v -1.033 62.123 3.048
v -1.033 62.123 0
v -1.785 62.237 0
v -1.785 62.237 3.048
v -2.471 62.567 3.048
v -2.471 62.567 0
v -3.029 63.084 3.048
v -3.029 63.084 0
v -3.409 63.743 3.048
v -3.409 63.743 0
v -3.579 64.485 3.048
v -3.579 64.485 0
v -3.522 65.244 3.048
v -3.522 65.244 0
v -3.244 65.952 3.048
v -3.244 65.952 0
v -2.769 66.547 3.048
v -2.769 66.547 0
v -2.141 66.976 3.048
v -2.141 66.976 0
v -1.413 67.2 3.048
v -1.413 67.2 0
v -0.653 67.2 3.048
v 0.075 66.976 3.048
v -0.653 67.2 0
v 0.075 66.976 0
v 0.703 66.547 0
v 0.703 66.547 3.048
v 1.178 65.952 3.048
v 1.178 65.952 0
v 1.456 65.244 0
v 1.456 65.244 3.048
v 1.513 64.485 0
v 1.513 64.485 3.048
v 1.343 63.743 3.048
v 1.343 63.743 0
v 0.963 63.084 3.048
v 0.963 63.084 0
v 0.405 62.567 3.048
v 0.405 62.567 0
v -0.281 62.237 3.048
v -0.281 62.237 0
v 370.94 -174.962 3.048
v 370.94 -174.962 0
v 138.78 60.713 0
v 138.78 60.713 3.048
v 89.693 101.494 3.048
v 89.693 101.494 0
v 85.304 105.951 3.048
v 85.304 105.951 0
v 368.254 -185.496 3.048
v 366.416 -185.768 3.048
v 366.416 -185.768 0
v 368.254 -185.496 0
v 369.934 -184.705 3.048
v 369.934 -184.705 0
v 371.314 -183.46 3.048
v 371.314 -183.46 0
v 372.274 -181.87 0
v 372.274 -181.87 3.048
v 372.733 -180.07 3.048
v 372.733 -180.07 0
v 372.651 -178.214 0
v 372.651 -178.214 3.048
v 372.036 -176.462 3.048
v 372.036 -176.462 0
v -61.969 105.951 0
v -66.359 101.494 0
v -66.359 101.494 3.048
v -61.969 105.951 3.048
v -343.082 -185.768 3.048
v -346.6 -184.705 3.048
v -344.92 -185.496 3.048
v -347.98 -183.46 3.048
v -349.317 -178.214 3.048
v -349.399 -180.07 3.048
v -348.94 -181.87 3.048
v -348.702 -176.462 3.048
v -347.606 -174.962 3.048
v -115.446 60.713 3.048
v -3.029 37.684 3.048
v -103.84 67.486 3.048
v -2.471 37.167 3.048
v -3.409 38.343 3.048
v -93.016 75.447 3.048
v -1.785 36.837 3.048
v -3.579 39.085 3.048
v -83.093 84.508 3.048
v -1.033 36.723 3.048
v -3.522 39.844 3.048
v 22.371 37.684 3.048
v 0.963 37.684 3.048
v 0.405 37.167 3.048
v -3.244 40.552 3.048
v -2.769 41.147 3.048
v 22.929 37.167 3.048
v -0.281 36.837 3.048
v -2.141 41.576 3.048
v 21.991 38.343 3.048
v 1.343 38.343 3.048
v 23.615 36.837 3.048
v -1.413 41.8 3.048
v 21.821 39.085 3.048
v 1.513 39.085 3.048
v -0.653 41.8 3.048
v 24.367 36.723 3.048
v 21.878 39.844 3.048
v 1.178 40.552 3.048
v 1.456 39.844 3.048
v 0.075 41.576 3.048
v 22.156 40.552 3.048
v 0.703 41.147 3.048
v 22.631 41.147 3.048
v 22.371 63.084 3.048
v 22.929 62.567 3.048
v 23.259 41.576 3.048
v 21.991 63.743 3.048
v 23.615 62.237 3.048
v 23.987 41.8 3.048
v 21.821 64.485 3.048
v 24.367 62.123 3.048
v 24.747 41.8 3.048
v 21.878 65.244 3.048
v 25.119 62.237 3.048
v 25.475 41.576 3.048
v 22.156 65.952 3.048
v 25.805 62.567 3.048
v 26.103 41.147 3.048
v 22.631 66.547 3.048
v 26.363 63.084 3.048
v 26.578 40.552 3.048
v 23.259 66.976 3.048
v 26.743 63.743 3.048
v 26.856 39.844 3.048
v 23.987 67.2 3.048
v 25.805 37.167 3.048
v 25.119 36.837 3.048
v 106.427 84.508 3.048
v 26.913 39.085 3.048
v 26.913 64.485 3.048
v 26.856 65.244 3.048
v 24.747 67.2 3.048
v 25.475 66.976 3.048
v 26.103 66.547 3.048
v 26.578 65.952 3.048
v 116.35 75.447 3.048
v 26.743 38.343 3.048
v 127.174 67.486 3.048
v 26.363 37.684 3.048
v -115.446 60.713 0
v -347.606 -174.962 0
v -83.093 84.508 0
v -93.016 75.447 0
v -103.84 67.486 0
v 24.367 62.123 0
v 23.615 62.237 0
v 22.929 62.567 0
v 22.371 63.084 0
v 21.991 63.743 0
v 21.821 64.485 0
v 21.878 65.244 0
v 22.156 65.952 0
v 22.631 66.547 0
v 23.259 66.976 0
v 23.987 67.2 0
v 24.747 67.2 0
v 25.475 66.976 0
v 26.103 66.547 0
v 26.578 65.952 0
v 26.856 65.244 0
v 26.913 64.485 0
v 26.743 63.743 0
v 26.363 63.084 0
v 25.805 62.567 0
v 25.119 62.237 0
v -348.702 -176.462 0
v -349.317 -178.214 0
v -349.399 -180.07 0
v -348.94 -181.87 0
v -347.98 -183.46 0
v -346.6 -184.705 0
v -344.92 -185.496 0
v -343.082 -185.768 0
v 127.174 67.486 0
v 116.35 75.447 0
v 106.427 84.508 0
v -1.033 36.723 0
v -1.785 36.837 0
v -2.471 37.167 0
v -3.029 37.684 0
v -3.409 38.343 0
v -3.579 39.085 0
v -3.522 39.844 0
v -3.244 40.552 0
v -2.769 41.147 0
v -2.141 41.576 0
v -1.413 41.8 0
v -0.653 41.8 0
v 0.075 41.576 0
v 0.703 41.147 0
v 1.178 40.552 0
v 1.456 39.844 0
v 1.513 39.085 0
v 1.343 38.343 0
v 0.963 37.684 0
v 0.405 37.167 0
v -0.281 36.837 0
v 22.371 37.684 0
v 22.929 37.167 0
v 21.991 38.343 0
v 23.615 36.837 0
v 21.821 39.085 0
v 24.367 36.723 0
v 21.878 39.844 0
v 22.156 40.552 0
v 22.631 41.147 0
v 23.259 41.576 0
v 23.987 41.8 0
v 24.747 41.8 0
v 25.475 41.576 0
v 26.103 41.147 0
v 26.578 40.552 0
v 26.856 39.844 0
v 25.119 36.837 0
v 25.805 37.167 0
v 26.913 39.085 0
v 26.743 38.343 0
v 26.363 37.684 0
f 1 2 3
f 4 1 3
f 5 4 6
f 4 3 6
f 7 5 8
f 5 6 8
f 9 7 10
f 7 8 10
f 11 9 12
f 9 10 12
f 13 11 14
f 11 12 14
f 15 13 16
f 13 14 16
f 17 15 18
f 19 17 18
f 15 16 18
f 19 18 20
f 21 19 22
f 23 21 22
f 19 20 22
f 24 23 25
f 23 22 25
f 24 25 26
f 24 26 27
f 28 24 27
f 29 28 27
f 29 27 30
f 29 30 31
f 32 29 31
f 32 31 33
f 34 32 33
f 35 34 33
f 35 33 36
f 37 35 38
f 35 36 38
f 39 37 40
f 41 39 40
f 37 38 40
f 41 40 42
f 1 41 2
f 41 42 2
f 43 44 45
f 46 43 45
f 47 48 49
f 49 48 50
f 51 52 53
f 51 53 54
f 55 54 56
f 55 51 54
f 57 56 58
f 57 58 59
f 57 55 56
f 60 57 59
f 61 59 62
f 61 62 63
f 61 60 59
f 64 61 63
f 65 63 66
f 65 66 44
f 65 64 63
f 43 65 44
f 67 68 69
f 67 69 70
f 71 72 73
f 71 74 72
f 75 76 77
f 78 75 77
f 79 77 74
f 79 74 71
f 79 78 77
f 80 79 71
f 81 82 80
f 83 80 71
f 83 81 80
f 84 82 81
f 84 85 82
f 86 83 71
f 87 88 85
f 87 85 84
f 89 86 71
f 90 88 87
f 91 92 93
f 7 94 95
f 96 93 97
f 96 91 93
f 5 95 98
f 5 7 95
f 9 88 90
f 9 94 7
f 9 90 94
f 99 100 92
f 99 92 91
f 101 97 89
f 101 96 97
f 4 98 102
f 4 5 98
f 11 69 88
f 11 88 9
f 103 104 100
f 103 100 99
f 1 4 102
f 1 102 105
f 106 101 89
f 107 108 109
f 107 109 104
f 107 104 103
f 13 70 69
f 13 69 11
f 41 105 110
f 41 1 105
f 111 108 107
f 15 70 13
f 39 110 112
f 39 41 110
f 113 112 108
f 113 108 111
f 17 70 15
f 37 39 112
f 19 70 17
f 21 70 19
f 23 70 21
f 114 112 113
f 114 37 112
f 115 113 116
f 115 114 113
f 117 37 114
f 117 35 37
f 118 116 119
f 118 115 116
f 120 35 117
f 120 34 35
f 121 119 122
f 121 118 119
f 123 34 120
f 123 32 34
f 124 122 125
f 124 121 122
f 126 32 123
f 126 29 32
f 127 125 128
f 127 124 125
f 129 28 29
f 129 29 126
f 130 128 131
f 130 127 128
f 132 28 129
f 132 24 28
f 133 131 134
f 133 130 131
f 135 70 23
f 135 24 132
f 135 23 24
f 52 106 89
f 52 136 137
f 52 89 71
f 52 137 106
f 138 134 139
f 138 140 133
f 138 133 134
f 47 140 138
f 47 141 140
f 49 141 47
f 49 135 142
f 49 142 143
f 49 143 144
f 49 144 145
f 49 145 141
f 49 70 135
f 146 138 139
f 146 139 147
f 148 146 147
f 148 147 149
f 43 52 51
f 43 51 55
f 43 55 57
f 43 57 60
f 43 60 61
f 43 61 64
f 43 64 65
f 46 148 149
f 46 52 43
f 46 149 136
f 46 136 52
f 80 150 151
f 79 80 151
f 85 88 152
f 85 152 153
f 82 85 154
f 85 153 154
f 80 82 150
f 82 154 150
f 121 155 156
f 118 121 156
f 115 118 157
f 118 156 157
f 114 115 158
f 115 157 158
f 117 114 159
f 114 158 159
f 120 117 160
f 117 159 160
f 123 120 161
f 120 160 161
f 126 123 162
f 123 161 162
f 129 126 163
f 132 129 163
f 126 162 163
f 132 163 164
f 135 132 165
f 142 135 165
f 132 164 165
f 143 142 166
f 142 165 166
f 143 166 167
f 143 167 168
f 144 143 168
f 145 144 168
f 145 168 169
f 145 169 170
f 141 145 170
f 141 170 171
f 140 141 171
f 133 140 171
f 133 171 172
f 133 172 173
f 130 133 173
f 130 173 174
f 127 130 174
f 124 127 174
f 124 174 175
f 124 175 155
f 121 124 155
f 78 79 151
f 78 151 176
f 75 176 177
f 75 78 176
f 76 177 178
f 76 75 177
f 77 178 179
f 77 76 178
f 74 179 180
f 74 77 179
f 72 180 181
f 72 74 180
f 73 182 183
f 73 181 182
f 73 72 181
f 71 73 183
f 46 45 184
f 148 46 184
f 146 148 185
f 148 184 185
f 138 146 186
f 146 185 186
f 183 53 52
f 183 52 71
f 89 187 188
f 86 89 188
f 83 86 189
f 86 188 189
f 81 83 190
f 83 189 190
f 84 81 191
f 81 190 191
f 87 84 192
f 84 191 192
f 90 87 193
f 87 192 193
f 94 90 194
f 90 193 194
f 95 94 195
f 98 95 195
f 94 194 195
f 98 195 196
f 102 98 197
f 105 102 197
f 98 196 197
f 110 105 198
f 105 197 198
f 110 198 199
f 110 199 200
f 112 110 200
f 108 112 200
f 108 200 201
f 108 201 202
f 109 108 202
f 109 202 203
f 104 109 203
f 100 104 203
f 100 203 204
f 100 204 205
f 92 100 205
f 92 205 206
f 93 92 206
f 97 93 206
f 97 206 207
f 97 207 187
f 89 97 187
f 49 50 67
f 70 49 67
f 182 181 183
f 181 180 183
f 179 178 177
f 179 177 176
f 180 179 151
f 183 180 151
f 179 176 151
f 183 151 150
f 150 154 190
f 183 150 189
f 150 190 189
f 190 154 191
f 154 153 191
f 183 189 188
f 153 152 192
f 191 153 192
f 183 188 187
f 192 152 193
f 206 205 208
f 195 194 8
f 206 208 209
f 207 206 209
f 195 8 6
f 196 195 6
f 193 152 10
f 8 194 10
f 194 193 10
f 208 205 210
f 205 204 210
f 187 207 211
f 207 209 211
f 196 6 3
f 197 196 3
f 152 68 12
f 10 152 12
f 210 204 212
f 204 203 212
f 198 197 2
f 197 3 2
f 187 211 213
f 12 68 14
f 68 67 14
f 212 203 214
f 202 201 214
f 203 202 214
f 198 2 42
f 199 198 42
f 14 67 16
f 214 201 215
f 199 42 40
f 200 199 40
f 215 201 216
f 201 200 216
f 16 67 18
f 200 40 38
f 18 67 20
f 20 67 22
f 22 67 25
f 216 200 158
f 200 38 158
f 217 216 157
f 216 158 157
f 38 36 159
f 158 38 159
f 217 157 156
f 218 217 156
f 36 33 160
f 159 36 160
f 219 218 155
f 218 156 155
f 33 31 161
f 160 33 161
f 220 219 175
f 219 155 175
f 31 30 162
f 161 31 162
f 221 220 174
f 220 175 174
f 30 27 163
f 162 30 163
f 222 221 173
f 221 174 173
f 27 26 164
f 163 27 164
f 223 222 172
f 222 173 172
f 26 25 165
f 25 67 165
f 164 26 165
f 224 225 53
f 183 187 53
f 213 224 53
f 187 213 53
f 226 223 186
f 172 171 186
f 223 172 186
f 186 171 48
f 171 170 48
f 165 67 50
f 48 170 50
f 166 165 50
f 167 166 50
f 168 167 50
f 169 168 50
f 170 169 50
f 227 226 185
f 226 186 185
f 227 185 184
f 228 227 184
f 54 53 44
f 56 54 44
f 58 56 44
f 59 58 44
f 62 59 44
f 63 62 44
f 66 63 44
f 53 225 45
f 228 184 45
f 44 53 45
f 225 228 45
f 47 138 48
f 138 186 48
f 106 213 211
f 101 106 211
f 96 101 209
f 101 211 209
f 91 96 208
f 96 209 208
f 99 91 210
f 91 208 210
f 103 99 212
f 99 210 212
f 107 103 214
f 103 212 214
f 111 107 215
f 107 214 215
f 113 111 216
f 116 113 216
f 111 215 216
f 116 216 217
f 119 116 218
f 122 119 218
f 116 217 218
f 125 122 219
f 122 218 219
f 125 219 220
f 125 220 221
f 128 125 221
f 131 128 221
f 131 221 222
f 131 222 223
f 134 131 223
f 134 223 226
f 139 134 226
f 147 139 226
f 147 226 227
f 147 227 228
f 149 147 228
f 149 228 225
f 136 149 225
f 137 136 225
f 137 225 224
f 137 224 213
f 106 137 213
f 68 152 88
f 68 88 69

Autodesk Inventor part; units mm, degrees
ref_plane "YZ Plane" through (0, 0, 0) normal (1, 0, 0) x (0, 1, 0)
ref_plane "XZ Plane" through (0, 0, 0) normal (0, 1, 0) x (-1, 0, 0)
ref_plane "XY Plane" through (0, 0, 0) normal (0, 0, 1) x (1, 0, 0)
sketch "Sketch1" plane through (0, 0, 0) normal (0, 0, 1) x (1, 0, 0)
  line L0 (381.5852, -185.7682) -> (94.217, 105.9508)
  line L1 (94.217, 105.9508) -> (-70.883, 105.9508)
  line L2 (-70.883, 105.9508) -> (-358.2512, -185.7682)
  line L3 (1105.6551, 353.06) -> (-810.8916, 353.06) construction
  line L4 (381.5852, -185.7682) -> (-358.2512, -185.7682)
  dimension "d4" = 165.1
  dimension "d7" = 291.719
extrude "Plate1" add sketch "Sketch1" along normal blind 3.048
sketch "Sketch2" plane through (0, 0, 3.048) normal (0, 0, 1) x (1, 0, 0)
  line L0 (94.217, 105.9508) -> (381.5852, -185.7682) construction
  line L1 (-70.883, 105.9508) -> (94.217, 105.9508) construction
  line L2 (-358.2512, -185.7682) -> (-70.883, 105.9508) construction
  line L3 (381.5852, -185.7682) -> (-358.2512, -185.7682) construction
  line L4 (11.667, 105.9508) -> (11.667, -185.7682) construction
  point P0 (0, 0)
  point P1 (24.367, 64.6758)
  point P2 (24.367, 39.2758)
  point P3 (-1.033, 64.6758)
  point P4 (-1.033, 39.2758)
  dimension "d8" = 12.7
  dimension "d9" = 41.275
  dimension "d10" = 25.4
hole "Hole1" at (24.367, 64.6758, 3.048) at (24.367, 39.2758, 3.048) at (-1.033, 39.2758, 3.048) at (-1.033, 64.6758, 3.048) direction (0, 0, -1) diameter 5.1054 end through all clearance for "Flat Head Machine Screw (82)" size "#10" standard "Ansi Unified Screw Threads"
sketch "Sketch3" plane through (0, 0, 0) normal (0, 0, -1) x (-1, 0, 0)
  circle A0 centre (1.033, 64.6758) radius 2.5527 construction
  circle A1 centre (1.033, 39.2758) radius 2.5527 construction
  circle A2 centre (-24.367, 39.2758) radius 2.5527 construction
  circle A3 centre (-24.367, 64.6758) radius 2.5527 construction
  line L0 (-94.217, 105.9508) -> (70.883, 105.9508) projected
  line L1 (-381.5852, -185.7682) -> (-94.217, 105.9508) construction
  line L2 (358.2512, -185.7682) -> (-381.5852, -185.7682) construction
  line L3 (70.883, 105.9508) -> (358.2512, -185.7682) construction
  line L4 (115.4456, 60.7134) -> (110.9219, 56.2572)
  line L5 (110.9219, 56.2572) -> (66.3592, 101.4945)
  line L6 (66.3592, 101.4945) -> (70.883, 105.9508)
  line L7 (70.883, 105.9508) -> (115.4456, 60.7134)
  line L8 (66.3592, 101.4945) -> (61.9694, 105.9508)
  line L9 (-11.667, 105.9508) -> (-11.667, 80.5508) construction
  line L10 (-11.667, 105.9508) -> (13.733, 105.9508) construction
  line L11 (-138.7797, 60.7134) -> (-134.256, 56.2572)
  line L12 (-134.256, 56.2572) -> (-89.6933, 101.4945)
  line L13 (-94.217, 105.9508) -> (-138.7797, 60.7134)
  line L14 (-89.6933, 101.4945) -> (-85.3035, 105.9508)
  line L15 (-85.3035, 105.9508) -> (-134.256, 56.2572)
  line L16 (-134.256, 56.2572) -> (-138.7797, 60.7134)
  line L17 (-138.7797, 60.7134) -> (-94.217, 105.9508)
  line L18 (-94.217, 105.9508) -> (-85.3035, 105.9508)
  line L19 (70.883, 105.9508) -> (61.9694, 105.9508)
  point P0 (0, 0)
  dimension "d18" = 6.35
  dimension "d19" = 63.5
  dimension "d20" = 25.4
  dimension "d21" = 90
extrude "Cut1" cut sketch "Sketch3" against normal blind 3.048
fillet "Corner Round1" radius 6.35 2 edges at (-358.2512, -185.7682, 1.524) (381.5852, -185.7682, 1.524)
fillet "Corner Round2" radius 127 2 edges at (-110.9219, 56.2572, 1.524) (134.256, 56.2572, 1.524)
equation "\"d16\" = Thickness"
equation "\"d22\" = Thickness"
equation "\"d2\" = Thickness"
equation "\"BendRadius\" = Thickness"
equation "\"BendReliefWidth\" = Thickness"
equation "\"BendReliefDepth\" = 0.5 * Thickness"
equation "\"CornerReliefSize\" = 4 * Thickness"
equation "\"MinimumRemnant\" = 2 * Thickness"
equation "\"TransitionRadius\" = BendRadius"
equation "\"JacobiRadiusSize\" = BendRadius"
equation "\"GapSize\" = Thickness"
equation "\"Thickness\" = 3.048"
properties part number "hopper_back_plate" material "Polycarbonate, Smoke"
